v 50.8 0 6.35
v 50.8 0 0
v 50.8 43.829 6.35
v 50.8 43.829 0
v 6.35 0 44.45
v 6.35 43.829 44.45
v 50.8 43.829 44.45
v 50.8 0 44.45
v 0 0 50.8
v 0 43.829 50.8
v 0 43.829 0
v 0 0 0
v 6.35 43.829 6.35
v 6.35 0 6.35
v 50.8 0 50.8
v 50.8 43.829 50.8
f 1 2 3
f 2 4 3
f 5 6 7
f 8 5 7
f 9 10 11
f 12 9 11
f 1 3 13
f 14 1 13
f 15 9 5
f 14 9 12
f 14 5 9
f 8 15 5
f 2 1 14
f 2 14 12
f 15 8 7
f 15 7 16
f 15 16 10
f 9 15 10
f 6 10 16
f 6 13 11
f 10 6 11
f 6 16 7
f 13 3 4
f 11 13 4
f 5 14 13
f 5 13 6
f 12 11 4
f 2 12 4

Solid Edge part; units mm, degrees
sketch "Sketch1" plane through (0, 0, 0) normal (1, 0, 0) x (0, 1, 0)
  line L0 (0, 0) -> (43.8289, 0)
sketch "Sketch2" plane through (0, 0, 0) normal (0, -1, 0) x (1, 0, 0)
  line L0 (0, 50.8) -> (0, 0)
  line L1 (0, 0) -> (50.8, 0)
  line L2 (50.8, 0) -> (50.8, 6.35)
  line L3 (50.8, 6.35) -> (6.35, 6.35)
  line L4 (6.35, 6.35) -> (6.35, 44.45)
  line L5 (6.35, 44.45) -> (50.8, 44.45)
  line L6 (50.8, 44.45) -> (50.8, 50.8)
  line L7 (50.8, 50.8) -> (0, 50.8)
  dimension "D1" = 50.8
  dimension "D2" = 50.8
  dimension "D3" = 6.35
sweep "SweptProtrusion_1" add profiles "Sketch2" path "Sketch1"
